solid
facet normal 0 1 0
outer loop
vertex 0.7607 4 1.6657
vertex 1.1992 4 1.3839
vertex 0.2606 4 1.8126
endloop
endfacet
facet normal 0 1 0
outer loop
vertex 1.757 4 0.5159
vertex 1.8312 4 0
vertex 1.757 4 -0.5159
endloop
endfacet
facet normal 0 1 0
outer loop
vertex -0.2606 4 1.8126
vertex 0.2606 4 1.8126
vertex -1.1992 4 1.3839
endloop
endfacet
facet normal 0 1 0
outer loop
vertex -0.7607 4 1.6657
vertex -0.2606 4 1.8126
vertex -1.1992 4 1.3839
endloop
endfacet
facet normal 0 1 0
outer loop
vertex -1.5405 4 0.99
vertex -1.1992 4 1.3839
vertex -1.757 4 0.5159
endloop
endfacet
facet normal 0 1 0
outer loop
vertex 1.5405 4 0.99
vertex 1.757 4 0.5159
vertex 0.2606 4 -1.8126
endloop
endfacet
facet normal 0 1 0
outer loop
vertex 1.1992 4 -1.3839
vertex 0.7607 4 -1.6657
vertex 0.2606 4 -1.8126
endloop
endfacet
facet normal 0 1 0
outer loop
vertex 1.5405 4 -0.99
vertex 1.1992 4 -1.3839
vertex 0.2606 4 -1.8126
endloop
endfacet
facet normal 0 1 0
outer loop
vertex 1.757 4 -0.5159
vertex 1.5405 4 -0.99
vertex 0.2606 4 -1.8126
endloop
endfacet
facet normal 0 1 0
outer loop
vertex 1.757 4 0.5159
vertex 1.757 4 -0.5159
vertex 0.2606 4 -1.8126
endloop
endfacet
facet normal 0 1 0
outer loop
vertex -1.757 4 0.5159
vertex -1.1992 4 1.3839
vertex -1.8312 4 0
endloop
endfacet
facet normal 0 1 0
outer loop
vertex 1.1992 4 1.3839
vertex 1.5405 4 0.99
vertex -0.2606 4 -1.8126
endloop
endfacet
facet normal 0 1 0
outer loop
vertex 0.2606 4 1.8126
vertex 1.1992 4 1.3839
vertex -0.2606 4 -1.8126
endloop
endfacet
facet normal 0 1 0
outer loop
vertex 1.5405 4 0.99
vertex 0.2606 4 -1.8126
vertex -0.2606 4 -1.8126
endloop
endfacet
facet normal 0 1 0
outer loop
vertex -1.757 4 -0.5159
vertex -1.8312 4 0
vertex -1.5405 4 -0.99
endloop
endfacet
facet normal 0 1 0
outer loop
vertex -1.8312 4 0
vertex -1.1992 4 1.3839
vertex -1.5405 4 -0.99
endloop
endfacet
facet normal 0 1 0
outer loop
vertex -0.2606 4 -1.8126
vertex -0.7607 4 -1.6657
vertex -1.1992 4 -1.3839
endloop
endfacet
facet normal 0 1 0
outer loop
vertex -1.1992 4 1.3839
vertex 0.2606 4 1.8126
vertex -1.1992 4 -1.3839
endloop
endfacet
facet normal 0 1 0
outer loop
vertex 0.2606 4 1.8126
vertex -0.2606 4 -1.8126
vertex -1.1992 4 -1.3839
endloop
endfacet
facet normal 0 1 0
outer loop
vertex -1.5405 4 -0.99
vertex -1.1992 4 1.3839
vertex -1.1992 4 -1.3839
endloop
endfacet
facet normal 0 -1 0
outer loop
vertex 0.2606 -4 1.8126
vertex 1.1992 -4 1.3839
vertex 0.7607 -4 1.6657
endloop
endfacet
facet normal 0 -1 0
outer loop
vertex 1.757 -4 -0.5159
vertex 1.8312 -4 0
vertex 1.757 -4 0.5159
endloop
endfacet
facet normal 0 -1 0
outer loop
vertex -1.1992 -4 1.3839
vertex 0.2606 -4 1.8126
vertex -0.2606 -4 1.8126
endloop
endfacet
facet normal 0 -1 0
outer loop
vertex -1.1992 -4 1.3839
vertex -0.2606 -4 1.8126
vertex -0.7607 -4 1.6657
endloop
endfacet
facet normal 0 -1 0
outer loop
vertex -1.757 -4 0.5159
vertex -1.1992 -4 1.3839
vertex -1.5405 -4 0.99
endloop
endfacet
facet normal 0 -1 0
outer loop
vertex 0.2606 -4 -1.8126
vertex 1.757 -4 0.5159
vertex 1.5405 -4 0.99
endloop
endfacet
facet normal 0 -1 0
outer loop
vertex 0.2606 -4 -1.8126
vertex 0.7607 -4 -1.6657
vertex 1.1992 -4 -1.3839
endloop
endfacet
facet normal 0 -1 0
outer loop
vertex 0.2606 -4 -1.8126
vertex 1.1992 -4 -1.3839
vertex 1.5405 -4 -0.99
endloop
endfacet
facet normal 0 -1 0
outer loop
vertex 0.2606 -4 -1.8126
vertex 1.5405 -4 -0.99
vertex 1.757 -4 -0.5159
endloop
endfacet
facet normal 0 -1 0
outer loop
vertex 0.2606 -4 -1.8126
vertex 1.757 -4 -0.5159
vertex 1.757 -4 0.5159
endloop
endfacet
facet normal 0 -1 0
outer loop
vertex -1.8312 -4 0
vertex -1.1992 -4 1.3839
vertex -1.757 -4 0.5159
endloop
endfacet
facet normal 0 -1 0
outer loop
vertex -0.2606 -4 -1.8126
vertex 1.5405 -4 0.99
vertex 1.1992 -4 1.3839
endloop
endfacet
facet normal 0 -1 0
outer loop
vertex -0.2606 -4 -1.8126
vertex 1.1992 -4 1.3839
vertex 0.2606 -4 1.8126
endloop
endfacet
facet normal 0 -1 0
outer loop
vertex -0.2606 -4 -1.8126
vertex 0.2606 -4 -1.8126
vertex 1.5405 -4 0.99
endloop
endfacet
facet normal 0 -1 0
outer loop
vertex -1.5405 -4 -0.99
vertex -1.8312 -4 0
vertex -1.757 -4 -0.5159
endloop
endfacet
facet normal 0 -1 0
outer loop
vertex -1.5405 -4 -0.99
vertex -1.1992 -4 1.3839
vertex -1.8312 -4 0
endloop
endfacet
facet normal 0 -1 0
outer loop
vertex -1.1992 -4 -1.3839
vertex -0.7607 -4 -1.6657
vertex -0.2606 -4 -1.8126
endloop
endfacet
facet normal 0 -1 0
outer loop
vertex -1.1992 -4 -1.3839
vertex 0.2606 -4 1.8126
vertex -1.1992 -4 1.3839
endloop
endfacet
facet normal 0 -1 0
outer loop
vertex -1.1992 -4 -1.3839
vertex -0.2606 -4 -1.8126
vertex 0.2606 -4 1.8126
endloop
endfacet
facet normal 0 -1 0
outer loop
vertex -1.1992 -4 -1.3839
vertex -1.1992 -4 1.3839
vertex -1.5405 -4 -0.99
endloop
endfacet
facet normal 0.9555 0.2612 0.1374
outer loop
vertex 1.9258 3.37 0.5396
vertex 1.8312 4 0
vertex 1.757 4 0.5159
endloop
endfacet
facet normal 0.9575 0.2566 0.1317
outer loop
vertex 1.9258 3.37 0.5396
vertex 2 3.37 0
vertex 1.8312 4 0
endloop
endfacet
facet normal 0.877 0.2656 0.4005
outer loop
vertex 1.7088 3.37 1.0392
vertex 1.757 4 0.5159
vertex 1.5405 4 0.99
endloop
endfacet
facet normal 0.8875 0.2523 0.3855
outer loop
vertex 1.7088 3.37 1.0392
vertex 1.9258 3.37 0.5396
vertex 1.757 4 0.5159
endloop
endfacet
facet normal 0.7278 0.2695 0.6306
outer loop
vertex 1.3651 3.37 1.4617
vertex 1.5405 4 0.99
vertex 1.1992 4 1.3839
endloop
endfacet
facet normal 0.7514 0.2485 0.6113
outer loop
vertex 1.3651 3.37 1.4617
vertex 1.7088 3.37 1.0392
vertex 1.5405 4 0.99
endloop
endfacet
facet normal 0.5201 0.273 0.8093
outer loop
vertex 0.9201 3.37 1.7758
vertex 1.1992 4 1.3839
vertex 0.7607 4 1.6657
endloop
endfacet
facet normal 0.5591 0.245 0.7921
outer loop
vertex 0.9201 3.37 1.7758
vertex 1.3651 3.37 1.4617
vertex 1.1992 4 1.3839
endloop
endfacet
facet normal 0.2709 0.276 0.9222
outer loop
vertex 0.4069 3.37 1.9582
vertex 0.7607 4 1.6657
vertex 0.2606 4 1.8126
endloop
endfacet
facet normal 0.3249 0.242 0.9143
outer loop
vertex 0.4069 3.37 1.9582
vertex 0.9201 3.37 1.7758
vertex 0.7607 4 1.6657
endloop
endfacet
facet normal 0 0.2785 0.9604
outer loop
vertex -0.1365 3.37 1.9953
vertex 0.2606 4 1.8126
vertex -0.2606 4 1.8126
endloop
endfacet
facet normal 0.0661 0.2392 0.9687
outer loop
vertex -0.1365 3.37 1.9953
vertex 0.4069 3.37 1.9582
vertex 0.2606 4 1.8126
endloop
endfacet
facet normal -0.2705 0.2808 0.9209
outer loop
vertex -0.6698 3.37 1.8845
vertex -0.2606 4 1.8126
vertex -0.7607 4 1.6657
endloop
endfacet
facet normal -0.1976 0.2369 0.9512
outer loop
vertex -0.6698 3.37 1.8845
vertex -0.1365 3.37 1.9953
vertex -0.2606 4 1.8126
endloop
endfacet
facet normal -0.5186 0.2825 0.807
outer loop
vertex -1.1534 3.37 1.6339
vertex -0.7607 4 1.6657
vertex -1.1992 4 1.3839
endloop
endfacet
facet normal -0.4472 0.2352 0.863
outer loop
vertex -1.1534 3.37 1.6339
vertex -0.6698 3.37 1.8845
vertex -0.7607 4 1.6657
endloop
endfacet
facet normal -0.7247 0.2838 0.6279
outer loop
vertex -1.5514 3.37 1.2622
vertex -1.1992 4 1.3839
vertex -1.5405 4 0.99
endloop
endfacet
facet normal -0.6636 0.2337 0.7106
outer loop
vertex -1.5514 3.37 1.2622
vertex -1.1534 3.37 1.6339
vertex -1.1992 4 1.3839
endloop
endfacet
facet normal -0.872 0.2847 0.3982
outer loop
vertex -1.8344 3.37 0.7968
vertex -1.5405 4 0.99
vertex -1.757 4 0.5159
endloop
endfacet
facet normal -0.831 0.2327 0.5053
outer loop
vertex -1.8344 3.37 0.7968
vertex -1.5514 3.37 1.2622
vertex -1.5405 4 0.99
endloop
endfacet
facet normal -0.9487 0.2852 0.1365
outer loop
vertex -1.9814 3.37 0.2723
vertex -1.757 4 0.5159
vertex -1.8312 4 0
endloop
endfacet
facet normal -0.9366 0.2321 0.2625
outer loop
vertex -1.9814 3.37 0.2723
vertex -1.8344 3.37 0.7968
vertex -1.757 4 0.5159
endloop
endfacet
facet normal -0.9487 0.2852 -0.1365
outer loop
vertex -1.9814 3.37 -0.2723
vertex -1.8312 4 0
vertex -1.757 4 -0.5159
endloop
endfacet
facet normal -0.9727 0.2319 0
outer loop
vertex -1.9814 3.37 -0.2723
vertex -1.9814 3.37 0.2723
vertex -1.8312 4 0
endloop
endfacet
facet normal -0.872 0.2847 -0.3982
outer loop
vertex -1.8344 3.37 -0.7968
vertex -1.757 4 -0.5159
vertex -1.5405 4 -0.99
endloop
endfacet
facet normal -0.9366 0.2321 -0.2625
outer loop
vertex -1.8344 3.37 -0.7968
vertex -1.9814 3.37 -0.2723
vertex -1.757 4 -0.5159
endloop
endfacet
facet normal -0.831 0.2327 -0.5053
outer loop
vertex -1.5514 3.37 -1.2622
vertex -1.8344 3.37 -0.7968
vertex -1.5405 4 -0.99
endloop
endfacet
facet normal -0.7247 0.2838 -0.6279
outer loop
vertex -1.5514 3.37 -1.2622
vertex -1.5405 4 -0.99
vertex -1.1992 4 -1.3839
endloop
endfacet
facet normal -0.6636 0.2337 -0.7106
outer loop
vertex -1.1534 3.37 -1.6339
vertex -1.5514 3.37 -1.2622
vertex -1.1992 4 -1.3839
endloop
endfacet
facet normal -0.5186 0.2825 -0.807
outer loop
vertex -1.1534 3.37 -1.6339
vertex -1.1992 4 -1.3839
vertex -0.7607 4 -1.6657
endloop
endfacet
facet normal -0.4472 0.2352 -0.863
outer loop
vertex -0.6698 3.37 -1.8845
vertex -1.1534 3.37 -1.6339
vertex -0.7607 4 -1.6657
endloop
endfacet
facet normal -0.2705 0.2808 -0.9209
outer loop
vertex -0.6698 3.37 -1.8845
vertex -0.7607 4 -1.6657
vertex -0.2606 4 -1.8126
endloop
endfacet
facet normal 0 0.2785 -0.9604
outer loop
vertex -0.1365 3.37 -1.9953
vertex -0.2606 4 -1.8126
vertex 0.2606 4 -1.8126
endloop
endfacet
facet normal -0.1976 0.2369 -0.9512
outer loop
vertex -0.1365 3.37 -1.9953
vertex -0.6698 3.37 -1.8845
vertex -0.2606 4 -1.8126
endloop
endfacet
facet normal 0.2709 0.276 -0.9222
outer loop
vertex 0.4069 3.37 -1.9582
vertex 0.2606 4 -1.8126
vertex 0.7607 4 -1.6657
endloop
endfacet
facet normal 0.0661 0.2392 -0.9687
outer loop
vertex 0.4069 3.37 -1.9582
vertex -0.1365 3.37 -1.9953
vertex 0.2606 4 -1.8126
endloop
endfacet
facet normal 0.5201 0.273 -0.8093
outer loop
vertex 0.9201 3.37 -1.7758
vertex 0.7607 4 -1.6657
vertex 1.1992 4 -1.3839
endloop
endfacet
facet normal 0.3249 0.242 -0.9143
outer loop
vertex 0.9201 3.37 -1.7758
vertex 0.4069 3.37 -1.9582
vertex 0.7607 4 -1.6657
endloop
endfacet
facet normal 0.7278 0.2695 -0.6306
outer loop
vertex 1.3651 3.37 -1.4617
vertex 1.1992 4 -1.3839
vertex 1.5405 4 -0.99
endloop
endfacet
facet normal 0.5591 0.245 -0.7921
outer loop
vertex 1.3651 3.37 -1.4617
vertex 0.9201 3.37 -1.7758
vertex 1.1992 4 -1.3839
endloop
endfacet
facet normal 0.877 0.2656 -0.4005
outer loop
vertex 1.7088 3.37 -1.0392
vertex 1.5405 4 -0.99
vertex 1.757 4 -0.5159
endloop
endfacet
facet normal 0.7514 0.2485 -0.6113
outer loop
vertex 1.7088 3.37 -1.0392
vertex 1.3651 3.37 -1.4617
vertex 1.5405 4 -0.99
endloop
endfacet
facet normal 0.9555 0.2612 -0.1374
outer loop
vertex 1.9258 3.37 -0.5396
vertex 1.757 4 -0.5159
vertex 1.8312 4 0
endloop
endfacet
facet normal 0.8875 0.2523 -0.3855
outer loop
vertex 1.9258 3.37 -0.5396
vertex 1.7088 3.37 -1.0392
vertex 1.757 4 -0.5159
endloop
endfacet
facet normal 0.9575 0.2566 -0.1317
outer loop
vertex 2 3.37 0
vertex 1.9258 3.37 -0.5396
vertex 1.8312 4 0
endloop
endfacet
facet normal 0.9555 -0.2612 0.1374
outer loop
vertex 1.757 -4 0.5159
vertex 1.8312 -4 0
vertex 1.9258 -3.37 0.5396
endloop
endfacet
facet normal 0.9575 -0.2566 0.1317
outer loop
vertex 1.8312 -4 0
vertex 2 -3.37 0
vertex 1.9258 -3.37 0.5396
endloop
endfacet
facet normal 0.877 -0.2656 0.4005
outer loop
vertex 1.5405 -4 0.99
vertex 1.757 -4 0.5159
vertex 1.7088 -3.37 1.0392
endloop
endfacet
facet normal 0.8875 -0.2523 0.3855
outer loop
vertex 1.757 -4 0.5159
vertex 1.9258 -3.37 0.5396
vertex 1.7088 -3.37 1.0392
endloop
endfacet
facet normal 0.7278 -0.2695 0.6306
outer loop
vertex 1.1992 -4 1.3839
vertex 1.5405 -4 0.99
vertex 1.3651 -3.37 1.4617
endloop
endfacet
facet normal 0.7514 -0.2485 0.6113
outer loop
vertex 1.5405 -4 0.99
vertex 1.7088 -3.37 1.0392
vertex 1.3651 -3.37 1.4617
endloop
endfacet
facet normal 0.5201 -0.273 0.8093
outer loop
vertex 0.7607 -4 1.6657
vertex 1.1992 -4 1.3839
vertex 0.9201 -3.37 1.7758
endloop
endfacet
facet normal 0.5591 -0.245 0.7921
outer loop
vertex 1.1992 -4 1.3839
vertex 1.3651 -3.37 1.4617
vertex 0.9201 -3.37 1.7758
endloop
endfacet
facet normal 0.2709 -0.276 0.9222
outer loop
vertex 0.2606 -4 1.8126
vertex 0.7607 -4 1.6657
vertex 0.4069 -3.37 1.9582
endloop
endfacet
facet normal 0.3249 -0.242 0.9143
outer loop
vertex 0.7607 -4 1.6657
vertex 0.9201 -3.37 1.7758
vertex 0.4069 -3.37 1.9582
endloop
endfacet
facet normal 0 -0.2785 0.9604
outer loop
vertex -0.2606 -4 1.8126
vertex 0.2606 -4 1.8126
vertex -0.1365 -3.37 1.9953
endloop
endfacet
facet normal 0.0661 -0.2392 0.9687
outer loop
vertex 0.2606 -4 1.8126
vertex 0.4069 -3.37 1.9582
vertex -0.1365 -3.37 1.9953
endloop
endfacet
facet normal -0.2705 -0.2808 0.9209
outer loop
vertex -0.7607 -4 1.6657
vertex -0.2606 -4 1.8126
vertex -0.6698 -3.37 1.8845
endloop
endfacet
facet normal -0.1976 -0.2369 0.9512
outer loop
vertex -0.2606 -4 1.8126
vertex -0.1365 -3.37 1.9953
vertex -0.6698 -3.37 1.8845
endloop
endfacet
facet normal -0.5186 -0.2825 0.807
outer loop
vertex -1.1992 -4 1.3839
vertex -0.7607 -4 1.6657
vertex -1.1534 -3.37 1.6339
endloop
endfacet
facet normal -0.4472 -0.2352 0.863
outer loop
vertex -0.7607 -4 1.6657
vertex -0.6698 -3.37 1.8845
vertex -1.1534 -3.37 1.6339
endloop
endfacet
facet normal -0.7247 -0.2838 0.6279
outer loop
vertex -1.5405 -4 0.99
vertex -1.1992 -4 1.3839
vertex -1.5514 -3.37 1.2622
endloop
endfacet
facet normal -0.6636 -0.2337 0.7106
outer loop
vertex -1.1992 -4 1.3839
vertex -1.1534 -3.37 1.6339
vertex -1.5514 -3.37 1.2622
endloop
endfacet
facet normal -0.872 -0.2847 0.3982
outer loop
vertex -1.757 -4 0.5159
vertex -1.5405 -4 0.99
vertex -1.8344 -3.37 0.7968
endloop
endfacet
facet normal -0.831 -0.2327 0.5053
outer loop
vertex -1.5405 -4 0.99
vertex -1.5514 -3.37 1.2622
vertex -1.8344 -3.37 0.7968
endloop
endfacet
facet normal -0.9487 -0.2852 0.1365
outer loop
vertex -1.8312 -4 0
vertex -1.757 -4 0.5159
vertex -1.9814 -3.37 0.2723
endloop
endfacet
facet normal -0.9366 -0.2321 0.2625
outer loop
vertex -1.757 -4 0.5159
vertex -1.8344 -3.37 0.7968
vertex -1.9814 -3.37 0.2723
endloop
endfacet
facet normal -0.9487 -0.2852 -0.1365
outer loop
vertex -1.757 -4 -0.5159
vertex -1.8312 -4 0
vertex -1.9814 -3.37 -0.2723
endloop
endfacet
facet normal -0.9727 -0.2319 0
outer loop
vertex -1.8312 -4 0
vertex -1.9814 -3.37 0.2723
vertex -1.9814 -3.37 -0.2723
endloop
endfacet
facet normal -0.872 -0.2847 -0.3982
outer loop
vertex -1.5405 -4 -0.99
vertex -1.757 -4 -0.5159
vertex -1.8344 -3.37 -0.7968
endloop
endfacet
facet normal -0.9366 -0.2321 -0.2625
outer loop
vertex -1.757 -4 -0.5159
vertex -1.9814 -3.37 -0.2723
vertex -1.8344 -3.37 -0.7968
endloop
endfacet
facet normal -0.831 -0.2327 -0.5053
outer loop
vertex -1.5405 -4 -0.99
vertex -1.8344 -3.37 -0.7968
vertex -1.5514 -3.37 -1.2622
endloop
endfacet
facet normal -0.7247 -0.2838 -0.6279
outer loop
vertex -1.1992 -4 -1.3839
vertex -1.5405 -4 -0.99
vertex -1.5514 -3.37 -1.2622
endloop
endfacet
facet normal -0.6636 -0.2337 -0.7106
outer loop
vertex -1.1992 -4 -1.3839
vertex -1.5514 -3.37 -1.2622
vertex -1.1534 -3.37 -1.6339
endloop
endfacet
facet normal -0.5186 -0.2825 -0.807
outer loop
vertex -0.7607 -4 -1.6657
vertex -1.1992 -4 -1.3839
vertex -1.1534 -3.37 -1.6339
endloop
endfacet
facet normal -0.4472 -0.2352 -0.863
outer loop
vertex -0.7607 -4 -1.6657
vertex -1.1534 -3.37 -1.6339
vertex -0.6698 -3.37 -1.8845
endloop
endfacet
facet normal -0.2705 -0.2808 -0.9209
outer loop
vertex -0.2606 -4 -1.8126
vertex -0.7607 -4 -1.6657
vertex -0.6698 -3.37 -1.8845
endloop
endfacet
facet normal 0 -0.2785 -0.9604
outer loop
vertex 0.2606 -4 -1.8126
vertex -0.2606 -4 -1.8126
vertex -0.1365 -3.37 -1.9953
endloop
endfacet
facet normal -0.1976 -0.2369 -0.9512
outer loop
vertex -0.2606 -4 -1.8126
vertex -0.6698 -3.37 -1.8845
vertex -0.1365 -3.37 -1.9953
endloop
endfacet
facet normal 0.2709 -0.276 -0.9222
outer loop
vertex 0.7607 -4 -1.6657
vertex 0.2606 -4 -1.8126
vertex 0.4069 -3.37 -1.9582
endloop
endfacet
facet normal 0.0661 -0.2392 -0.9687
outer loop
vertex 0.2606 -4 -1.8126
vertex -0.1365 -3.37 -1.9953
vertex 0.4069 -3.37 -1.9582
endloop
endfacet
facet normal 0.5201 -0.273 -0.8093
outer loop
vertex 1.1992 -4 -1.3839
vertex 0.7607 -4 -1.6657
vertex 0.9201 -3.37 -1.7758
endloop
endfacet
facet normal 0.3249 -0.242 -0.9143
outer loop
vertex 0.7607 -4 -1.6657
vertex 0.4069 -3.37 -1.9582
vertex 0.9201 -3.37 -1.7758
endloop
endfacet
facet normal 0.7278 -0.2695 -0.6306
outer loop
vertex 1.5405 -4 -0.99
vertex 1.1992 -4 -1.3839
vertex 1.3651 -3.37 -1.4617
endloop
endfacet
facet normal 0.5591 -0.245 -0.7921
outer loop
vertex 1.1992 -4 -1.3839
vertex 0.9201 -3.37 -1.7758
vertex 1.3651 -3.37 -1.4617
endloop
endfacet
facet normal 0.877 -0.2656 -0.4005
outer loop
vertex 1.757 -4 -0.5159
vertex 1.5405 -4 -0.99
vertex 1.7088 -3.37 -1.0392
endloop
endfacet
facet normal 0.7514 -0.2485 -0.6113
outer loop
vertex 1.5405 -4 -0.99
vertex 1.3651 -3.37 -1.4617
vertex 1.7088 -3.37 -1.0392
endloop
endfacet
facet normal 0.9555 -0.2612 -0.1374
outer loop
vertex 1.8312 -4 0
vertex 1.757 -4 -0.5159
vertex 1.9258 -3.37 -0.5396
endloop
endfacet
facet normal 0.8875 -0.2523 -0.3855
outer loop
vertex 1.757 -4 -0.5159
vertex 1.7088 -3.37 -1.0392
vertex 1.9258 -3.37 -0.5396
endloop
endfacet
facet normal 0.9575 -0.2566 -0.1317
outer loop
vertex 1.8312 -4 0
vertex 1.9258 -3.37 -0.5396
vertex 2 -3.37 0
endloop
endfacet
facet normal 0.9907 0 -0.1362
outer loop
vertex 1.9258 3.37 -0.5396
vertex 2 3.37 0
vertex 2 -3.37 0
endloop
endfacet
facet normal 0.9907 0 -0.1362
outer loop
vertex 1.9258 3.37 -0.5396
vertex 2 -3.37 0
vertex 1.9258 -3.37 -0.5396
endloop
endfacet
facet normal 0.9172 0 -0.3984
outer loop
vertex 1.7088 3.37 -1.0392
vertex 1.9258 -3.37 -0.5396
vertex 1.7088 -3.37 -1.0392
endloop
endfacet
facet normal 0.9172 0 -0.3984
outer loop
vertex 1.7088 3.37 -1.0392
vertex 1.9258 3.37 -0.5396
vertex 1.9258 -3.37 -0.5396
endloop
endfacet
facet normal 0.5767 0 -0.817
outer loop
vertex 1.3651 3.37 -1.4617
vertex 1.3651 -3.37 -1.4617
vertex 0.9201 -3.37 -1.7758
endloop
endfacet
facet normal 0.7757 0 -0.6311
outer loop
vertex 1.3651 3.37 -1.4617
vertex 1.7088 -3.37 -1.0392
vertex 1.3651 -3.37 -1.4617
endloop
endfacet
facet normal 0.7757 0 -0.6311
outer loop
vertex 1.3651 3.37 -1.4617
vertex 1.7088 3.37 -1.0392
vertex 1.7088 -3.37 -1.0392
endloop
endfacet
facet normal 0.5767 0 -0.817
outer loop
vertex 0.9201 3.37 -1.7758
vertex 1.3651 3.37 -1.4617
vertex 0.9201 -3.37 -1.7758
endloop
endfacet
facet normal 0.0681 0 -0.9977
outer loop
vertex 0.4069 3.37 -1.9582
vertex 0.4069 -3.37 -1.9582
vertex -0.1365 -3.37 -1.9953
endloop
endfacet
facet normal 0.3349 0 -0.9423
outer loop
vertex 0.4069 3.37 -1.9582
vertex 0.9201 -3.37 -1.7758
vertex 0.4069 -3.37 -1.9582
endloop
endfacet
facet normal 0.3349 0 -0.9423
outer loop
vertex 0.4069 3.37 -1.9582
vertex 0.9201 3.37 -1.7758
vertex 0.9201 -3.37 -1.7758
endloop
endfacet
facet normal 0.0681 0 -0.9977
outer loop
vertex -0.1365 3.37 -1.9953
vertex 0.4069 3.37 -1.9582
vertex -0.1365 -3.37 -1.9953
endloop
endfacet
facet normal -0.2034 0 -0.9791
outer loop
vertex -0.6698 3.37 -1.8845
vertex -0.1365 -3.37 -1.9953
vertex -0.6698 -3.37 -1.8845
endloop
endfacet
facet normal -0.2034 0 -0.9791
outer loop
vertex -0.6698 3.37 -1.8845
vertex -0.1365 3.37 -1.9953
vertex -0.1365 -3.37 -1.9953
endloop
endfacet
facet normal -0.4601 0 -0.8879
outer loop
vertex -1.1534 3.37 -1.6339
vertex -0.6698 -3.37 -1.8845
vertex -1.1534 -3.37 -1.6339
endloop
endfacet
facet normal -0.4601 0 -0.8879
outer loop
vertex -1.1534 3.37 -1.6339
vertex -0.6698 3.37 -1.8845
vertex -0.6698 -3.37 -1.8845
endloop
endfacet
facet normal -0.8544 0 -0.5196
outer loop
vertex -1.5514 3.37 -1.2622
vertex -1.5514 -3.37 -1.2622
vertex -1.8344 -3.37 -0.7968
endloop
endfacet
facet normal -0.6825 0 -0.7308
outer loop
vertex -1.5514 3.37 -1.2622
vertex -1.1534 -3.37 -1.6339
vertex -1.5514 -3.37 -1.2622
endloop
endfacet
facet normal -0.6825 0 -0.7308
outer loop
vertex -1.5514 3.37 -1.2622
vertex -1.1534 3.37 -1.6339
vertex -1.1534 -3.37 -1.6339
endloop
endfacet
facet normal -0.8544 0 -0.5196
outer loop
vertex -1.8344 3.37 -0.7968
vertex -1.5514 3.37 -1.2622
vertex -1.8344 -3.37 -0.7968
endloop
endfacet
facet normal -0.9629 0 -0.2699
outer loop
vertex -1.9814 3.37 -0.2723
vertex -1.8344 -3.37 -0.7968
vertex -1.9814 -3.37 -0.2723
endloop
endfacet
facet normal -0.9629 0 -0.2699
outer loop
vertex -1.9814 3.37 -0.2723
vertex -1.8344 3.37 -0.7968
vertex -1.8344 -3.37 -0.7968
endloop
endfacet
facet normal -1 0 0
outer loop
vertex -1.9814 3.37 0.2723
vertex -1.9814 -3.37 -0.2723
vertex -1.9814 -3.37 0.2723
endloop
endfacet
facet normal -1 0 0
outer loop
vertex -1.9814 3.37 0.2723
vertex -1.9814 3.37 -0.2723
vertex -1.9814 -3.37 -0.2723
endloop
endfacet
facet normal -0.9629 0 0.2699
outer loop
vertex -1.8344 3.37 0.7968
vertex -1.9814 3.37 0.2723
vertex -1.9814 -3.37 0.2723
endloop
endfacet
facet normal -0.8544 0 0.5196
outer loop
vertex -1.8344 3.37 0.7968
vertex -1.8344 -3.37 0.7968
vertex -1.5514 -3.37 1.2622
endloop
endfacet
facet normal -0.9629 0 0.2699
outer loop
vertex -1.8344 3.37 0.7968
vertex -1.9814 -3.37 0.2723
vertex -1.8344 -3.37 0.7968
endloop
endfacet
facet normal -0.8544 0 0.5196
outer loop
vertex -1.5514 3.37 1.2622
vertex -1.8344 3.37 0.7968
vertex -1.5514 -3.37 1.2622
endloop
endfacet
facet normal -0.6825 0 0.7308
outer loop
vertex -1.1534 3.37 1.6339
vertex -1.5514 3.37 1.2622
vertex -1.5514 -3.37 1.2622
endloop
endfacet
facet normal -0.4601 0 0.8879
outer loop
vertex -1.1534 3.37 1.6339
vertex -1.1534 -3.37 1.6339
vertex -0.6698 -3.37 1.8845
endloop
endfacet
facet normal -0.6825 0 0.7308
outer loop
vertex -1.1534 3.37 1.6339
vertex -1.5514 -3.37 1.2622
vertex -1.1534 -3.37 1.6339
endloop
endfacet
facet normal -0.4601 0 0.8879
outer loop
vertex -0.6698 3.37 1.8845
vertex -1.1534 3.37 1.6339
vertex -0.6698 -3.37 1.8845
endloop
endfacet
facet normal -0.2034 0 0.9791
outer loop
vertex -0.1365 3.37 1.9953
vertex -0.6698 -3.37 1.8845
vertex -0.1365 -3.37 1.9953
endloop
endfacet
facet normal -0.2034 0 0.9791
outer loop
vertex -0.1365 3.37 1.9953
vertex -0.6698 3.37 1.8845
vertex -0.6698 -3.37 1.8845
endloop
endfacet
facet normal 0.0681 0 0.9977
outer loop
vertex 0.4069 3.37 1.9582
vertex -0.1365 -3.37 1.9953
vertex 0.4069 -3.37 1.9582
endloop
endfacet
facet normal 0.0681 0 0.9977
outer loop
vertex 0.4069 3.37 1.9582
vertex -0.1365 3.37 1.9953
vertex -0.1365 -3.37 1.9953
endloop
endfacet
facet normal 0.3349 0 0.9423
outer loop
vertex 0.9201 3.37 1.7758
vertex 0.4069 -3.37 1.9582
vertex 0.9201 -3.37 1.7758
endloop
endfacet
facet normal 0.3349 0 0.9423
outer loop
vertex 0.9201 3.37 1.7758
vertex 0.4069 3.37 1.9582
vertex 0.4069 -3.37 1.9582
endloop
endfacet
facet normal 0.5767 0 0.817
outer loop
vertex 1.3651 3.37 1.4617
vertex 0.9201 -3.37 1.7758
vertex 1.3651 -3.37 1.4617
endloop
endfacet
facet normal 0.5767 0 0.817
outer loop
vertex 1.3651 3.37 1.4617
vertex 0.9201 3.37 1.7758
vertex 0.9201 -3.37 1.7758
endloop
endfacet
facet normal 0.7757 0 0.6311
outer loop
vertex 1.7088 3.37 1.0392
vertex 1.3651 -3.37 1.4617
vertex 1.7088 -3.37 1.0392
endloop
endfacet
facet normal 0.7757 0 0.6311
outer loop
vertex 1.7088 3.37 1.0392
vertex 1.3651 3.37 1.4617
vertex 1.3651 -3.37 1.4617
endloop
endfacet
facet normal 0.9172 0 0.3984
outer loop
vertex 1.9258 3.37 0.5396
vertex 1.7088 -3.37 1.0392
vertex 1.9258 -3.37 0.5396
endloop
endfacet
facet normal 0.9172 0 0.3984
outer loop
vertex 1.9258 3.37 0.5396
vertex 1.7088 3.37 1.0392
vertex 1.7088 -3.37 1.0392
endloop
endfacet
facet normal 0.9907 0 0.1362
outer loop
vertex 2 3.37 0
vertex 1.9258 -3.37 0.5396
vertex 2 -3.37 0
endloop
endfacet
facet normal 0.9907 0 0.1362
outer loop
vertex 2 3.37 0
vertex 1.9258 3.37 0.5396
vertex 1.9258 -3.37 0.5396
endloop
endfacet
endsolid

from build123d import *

# Parameters (mm, degrees)
SKETCH_1_W = 2
SKETCH_1_H = 8


with BuildPart() as part:
    # 草图1 → 旋转1 (revolve)
    with BuildSketch(Plane.XY):
        with Locations((1, 0)):
            Rectangle(SKETCH_1_W, SKETCH_1_H)
    revolve(axis=Axis((0, -4, 0), (0, 1, 0)))

    # 草图2 → 切除-旋转1 (revolve, cut)
    with BuildSketch(Plane.XY):
        Polygon((1.831192009, -4), (2, -3.37), (2.1, -3.37), (2.1, -4.1), (1.831192009, -4.1), align=None)
    cut_revolve_1 = revolve(axis=Axis((0, 0, 0), (0, -1, 0)), mode=Mode.SUBTRACT)

    # 镜向1: 切除-旋转1 across plane
    add(cut_revolve_1.mirror(Plane.ZX), mode=Mode.SUBTRACT)


solid = part.part
